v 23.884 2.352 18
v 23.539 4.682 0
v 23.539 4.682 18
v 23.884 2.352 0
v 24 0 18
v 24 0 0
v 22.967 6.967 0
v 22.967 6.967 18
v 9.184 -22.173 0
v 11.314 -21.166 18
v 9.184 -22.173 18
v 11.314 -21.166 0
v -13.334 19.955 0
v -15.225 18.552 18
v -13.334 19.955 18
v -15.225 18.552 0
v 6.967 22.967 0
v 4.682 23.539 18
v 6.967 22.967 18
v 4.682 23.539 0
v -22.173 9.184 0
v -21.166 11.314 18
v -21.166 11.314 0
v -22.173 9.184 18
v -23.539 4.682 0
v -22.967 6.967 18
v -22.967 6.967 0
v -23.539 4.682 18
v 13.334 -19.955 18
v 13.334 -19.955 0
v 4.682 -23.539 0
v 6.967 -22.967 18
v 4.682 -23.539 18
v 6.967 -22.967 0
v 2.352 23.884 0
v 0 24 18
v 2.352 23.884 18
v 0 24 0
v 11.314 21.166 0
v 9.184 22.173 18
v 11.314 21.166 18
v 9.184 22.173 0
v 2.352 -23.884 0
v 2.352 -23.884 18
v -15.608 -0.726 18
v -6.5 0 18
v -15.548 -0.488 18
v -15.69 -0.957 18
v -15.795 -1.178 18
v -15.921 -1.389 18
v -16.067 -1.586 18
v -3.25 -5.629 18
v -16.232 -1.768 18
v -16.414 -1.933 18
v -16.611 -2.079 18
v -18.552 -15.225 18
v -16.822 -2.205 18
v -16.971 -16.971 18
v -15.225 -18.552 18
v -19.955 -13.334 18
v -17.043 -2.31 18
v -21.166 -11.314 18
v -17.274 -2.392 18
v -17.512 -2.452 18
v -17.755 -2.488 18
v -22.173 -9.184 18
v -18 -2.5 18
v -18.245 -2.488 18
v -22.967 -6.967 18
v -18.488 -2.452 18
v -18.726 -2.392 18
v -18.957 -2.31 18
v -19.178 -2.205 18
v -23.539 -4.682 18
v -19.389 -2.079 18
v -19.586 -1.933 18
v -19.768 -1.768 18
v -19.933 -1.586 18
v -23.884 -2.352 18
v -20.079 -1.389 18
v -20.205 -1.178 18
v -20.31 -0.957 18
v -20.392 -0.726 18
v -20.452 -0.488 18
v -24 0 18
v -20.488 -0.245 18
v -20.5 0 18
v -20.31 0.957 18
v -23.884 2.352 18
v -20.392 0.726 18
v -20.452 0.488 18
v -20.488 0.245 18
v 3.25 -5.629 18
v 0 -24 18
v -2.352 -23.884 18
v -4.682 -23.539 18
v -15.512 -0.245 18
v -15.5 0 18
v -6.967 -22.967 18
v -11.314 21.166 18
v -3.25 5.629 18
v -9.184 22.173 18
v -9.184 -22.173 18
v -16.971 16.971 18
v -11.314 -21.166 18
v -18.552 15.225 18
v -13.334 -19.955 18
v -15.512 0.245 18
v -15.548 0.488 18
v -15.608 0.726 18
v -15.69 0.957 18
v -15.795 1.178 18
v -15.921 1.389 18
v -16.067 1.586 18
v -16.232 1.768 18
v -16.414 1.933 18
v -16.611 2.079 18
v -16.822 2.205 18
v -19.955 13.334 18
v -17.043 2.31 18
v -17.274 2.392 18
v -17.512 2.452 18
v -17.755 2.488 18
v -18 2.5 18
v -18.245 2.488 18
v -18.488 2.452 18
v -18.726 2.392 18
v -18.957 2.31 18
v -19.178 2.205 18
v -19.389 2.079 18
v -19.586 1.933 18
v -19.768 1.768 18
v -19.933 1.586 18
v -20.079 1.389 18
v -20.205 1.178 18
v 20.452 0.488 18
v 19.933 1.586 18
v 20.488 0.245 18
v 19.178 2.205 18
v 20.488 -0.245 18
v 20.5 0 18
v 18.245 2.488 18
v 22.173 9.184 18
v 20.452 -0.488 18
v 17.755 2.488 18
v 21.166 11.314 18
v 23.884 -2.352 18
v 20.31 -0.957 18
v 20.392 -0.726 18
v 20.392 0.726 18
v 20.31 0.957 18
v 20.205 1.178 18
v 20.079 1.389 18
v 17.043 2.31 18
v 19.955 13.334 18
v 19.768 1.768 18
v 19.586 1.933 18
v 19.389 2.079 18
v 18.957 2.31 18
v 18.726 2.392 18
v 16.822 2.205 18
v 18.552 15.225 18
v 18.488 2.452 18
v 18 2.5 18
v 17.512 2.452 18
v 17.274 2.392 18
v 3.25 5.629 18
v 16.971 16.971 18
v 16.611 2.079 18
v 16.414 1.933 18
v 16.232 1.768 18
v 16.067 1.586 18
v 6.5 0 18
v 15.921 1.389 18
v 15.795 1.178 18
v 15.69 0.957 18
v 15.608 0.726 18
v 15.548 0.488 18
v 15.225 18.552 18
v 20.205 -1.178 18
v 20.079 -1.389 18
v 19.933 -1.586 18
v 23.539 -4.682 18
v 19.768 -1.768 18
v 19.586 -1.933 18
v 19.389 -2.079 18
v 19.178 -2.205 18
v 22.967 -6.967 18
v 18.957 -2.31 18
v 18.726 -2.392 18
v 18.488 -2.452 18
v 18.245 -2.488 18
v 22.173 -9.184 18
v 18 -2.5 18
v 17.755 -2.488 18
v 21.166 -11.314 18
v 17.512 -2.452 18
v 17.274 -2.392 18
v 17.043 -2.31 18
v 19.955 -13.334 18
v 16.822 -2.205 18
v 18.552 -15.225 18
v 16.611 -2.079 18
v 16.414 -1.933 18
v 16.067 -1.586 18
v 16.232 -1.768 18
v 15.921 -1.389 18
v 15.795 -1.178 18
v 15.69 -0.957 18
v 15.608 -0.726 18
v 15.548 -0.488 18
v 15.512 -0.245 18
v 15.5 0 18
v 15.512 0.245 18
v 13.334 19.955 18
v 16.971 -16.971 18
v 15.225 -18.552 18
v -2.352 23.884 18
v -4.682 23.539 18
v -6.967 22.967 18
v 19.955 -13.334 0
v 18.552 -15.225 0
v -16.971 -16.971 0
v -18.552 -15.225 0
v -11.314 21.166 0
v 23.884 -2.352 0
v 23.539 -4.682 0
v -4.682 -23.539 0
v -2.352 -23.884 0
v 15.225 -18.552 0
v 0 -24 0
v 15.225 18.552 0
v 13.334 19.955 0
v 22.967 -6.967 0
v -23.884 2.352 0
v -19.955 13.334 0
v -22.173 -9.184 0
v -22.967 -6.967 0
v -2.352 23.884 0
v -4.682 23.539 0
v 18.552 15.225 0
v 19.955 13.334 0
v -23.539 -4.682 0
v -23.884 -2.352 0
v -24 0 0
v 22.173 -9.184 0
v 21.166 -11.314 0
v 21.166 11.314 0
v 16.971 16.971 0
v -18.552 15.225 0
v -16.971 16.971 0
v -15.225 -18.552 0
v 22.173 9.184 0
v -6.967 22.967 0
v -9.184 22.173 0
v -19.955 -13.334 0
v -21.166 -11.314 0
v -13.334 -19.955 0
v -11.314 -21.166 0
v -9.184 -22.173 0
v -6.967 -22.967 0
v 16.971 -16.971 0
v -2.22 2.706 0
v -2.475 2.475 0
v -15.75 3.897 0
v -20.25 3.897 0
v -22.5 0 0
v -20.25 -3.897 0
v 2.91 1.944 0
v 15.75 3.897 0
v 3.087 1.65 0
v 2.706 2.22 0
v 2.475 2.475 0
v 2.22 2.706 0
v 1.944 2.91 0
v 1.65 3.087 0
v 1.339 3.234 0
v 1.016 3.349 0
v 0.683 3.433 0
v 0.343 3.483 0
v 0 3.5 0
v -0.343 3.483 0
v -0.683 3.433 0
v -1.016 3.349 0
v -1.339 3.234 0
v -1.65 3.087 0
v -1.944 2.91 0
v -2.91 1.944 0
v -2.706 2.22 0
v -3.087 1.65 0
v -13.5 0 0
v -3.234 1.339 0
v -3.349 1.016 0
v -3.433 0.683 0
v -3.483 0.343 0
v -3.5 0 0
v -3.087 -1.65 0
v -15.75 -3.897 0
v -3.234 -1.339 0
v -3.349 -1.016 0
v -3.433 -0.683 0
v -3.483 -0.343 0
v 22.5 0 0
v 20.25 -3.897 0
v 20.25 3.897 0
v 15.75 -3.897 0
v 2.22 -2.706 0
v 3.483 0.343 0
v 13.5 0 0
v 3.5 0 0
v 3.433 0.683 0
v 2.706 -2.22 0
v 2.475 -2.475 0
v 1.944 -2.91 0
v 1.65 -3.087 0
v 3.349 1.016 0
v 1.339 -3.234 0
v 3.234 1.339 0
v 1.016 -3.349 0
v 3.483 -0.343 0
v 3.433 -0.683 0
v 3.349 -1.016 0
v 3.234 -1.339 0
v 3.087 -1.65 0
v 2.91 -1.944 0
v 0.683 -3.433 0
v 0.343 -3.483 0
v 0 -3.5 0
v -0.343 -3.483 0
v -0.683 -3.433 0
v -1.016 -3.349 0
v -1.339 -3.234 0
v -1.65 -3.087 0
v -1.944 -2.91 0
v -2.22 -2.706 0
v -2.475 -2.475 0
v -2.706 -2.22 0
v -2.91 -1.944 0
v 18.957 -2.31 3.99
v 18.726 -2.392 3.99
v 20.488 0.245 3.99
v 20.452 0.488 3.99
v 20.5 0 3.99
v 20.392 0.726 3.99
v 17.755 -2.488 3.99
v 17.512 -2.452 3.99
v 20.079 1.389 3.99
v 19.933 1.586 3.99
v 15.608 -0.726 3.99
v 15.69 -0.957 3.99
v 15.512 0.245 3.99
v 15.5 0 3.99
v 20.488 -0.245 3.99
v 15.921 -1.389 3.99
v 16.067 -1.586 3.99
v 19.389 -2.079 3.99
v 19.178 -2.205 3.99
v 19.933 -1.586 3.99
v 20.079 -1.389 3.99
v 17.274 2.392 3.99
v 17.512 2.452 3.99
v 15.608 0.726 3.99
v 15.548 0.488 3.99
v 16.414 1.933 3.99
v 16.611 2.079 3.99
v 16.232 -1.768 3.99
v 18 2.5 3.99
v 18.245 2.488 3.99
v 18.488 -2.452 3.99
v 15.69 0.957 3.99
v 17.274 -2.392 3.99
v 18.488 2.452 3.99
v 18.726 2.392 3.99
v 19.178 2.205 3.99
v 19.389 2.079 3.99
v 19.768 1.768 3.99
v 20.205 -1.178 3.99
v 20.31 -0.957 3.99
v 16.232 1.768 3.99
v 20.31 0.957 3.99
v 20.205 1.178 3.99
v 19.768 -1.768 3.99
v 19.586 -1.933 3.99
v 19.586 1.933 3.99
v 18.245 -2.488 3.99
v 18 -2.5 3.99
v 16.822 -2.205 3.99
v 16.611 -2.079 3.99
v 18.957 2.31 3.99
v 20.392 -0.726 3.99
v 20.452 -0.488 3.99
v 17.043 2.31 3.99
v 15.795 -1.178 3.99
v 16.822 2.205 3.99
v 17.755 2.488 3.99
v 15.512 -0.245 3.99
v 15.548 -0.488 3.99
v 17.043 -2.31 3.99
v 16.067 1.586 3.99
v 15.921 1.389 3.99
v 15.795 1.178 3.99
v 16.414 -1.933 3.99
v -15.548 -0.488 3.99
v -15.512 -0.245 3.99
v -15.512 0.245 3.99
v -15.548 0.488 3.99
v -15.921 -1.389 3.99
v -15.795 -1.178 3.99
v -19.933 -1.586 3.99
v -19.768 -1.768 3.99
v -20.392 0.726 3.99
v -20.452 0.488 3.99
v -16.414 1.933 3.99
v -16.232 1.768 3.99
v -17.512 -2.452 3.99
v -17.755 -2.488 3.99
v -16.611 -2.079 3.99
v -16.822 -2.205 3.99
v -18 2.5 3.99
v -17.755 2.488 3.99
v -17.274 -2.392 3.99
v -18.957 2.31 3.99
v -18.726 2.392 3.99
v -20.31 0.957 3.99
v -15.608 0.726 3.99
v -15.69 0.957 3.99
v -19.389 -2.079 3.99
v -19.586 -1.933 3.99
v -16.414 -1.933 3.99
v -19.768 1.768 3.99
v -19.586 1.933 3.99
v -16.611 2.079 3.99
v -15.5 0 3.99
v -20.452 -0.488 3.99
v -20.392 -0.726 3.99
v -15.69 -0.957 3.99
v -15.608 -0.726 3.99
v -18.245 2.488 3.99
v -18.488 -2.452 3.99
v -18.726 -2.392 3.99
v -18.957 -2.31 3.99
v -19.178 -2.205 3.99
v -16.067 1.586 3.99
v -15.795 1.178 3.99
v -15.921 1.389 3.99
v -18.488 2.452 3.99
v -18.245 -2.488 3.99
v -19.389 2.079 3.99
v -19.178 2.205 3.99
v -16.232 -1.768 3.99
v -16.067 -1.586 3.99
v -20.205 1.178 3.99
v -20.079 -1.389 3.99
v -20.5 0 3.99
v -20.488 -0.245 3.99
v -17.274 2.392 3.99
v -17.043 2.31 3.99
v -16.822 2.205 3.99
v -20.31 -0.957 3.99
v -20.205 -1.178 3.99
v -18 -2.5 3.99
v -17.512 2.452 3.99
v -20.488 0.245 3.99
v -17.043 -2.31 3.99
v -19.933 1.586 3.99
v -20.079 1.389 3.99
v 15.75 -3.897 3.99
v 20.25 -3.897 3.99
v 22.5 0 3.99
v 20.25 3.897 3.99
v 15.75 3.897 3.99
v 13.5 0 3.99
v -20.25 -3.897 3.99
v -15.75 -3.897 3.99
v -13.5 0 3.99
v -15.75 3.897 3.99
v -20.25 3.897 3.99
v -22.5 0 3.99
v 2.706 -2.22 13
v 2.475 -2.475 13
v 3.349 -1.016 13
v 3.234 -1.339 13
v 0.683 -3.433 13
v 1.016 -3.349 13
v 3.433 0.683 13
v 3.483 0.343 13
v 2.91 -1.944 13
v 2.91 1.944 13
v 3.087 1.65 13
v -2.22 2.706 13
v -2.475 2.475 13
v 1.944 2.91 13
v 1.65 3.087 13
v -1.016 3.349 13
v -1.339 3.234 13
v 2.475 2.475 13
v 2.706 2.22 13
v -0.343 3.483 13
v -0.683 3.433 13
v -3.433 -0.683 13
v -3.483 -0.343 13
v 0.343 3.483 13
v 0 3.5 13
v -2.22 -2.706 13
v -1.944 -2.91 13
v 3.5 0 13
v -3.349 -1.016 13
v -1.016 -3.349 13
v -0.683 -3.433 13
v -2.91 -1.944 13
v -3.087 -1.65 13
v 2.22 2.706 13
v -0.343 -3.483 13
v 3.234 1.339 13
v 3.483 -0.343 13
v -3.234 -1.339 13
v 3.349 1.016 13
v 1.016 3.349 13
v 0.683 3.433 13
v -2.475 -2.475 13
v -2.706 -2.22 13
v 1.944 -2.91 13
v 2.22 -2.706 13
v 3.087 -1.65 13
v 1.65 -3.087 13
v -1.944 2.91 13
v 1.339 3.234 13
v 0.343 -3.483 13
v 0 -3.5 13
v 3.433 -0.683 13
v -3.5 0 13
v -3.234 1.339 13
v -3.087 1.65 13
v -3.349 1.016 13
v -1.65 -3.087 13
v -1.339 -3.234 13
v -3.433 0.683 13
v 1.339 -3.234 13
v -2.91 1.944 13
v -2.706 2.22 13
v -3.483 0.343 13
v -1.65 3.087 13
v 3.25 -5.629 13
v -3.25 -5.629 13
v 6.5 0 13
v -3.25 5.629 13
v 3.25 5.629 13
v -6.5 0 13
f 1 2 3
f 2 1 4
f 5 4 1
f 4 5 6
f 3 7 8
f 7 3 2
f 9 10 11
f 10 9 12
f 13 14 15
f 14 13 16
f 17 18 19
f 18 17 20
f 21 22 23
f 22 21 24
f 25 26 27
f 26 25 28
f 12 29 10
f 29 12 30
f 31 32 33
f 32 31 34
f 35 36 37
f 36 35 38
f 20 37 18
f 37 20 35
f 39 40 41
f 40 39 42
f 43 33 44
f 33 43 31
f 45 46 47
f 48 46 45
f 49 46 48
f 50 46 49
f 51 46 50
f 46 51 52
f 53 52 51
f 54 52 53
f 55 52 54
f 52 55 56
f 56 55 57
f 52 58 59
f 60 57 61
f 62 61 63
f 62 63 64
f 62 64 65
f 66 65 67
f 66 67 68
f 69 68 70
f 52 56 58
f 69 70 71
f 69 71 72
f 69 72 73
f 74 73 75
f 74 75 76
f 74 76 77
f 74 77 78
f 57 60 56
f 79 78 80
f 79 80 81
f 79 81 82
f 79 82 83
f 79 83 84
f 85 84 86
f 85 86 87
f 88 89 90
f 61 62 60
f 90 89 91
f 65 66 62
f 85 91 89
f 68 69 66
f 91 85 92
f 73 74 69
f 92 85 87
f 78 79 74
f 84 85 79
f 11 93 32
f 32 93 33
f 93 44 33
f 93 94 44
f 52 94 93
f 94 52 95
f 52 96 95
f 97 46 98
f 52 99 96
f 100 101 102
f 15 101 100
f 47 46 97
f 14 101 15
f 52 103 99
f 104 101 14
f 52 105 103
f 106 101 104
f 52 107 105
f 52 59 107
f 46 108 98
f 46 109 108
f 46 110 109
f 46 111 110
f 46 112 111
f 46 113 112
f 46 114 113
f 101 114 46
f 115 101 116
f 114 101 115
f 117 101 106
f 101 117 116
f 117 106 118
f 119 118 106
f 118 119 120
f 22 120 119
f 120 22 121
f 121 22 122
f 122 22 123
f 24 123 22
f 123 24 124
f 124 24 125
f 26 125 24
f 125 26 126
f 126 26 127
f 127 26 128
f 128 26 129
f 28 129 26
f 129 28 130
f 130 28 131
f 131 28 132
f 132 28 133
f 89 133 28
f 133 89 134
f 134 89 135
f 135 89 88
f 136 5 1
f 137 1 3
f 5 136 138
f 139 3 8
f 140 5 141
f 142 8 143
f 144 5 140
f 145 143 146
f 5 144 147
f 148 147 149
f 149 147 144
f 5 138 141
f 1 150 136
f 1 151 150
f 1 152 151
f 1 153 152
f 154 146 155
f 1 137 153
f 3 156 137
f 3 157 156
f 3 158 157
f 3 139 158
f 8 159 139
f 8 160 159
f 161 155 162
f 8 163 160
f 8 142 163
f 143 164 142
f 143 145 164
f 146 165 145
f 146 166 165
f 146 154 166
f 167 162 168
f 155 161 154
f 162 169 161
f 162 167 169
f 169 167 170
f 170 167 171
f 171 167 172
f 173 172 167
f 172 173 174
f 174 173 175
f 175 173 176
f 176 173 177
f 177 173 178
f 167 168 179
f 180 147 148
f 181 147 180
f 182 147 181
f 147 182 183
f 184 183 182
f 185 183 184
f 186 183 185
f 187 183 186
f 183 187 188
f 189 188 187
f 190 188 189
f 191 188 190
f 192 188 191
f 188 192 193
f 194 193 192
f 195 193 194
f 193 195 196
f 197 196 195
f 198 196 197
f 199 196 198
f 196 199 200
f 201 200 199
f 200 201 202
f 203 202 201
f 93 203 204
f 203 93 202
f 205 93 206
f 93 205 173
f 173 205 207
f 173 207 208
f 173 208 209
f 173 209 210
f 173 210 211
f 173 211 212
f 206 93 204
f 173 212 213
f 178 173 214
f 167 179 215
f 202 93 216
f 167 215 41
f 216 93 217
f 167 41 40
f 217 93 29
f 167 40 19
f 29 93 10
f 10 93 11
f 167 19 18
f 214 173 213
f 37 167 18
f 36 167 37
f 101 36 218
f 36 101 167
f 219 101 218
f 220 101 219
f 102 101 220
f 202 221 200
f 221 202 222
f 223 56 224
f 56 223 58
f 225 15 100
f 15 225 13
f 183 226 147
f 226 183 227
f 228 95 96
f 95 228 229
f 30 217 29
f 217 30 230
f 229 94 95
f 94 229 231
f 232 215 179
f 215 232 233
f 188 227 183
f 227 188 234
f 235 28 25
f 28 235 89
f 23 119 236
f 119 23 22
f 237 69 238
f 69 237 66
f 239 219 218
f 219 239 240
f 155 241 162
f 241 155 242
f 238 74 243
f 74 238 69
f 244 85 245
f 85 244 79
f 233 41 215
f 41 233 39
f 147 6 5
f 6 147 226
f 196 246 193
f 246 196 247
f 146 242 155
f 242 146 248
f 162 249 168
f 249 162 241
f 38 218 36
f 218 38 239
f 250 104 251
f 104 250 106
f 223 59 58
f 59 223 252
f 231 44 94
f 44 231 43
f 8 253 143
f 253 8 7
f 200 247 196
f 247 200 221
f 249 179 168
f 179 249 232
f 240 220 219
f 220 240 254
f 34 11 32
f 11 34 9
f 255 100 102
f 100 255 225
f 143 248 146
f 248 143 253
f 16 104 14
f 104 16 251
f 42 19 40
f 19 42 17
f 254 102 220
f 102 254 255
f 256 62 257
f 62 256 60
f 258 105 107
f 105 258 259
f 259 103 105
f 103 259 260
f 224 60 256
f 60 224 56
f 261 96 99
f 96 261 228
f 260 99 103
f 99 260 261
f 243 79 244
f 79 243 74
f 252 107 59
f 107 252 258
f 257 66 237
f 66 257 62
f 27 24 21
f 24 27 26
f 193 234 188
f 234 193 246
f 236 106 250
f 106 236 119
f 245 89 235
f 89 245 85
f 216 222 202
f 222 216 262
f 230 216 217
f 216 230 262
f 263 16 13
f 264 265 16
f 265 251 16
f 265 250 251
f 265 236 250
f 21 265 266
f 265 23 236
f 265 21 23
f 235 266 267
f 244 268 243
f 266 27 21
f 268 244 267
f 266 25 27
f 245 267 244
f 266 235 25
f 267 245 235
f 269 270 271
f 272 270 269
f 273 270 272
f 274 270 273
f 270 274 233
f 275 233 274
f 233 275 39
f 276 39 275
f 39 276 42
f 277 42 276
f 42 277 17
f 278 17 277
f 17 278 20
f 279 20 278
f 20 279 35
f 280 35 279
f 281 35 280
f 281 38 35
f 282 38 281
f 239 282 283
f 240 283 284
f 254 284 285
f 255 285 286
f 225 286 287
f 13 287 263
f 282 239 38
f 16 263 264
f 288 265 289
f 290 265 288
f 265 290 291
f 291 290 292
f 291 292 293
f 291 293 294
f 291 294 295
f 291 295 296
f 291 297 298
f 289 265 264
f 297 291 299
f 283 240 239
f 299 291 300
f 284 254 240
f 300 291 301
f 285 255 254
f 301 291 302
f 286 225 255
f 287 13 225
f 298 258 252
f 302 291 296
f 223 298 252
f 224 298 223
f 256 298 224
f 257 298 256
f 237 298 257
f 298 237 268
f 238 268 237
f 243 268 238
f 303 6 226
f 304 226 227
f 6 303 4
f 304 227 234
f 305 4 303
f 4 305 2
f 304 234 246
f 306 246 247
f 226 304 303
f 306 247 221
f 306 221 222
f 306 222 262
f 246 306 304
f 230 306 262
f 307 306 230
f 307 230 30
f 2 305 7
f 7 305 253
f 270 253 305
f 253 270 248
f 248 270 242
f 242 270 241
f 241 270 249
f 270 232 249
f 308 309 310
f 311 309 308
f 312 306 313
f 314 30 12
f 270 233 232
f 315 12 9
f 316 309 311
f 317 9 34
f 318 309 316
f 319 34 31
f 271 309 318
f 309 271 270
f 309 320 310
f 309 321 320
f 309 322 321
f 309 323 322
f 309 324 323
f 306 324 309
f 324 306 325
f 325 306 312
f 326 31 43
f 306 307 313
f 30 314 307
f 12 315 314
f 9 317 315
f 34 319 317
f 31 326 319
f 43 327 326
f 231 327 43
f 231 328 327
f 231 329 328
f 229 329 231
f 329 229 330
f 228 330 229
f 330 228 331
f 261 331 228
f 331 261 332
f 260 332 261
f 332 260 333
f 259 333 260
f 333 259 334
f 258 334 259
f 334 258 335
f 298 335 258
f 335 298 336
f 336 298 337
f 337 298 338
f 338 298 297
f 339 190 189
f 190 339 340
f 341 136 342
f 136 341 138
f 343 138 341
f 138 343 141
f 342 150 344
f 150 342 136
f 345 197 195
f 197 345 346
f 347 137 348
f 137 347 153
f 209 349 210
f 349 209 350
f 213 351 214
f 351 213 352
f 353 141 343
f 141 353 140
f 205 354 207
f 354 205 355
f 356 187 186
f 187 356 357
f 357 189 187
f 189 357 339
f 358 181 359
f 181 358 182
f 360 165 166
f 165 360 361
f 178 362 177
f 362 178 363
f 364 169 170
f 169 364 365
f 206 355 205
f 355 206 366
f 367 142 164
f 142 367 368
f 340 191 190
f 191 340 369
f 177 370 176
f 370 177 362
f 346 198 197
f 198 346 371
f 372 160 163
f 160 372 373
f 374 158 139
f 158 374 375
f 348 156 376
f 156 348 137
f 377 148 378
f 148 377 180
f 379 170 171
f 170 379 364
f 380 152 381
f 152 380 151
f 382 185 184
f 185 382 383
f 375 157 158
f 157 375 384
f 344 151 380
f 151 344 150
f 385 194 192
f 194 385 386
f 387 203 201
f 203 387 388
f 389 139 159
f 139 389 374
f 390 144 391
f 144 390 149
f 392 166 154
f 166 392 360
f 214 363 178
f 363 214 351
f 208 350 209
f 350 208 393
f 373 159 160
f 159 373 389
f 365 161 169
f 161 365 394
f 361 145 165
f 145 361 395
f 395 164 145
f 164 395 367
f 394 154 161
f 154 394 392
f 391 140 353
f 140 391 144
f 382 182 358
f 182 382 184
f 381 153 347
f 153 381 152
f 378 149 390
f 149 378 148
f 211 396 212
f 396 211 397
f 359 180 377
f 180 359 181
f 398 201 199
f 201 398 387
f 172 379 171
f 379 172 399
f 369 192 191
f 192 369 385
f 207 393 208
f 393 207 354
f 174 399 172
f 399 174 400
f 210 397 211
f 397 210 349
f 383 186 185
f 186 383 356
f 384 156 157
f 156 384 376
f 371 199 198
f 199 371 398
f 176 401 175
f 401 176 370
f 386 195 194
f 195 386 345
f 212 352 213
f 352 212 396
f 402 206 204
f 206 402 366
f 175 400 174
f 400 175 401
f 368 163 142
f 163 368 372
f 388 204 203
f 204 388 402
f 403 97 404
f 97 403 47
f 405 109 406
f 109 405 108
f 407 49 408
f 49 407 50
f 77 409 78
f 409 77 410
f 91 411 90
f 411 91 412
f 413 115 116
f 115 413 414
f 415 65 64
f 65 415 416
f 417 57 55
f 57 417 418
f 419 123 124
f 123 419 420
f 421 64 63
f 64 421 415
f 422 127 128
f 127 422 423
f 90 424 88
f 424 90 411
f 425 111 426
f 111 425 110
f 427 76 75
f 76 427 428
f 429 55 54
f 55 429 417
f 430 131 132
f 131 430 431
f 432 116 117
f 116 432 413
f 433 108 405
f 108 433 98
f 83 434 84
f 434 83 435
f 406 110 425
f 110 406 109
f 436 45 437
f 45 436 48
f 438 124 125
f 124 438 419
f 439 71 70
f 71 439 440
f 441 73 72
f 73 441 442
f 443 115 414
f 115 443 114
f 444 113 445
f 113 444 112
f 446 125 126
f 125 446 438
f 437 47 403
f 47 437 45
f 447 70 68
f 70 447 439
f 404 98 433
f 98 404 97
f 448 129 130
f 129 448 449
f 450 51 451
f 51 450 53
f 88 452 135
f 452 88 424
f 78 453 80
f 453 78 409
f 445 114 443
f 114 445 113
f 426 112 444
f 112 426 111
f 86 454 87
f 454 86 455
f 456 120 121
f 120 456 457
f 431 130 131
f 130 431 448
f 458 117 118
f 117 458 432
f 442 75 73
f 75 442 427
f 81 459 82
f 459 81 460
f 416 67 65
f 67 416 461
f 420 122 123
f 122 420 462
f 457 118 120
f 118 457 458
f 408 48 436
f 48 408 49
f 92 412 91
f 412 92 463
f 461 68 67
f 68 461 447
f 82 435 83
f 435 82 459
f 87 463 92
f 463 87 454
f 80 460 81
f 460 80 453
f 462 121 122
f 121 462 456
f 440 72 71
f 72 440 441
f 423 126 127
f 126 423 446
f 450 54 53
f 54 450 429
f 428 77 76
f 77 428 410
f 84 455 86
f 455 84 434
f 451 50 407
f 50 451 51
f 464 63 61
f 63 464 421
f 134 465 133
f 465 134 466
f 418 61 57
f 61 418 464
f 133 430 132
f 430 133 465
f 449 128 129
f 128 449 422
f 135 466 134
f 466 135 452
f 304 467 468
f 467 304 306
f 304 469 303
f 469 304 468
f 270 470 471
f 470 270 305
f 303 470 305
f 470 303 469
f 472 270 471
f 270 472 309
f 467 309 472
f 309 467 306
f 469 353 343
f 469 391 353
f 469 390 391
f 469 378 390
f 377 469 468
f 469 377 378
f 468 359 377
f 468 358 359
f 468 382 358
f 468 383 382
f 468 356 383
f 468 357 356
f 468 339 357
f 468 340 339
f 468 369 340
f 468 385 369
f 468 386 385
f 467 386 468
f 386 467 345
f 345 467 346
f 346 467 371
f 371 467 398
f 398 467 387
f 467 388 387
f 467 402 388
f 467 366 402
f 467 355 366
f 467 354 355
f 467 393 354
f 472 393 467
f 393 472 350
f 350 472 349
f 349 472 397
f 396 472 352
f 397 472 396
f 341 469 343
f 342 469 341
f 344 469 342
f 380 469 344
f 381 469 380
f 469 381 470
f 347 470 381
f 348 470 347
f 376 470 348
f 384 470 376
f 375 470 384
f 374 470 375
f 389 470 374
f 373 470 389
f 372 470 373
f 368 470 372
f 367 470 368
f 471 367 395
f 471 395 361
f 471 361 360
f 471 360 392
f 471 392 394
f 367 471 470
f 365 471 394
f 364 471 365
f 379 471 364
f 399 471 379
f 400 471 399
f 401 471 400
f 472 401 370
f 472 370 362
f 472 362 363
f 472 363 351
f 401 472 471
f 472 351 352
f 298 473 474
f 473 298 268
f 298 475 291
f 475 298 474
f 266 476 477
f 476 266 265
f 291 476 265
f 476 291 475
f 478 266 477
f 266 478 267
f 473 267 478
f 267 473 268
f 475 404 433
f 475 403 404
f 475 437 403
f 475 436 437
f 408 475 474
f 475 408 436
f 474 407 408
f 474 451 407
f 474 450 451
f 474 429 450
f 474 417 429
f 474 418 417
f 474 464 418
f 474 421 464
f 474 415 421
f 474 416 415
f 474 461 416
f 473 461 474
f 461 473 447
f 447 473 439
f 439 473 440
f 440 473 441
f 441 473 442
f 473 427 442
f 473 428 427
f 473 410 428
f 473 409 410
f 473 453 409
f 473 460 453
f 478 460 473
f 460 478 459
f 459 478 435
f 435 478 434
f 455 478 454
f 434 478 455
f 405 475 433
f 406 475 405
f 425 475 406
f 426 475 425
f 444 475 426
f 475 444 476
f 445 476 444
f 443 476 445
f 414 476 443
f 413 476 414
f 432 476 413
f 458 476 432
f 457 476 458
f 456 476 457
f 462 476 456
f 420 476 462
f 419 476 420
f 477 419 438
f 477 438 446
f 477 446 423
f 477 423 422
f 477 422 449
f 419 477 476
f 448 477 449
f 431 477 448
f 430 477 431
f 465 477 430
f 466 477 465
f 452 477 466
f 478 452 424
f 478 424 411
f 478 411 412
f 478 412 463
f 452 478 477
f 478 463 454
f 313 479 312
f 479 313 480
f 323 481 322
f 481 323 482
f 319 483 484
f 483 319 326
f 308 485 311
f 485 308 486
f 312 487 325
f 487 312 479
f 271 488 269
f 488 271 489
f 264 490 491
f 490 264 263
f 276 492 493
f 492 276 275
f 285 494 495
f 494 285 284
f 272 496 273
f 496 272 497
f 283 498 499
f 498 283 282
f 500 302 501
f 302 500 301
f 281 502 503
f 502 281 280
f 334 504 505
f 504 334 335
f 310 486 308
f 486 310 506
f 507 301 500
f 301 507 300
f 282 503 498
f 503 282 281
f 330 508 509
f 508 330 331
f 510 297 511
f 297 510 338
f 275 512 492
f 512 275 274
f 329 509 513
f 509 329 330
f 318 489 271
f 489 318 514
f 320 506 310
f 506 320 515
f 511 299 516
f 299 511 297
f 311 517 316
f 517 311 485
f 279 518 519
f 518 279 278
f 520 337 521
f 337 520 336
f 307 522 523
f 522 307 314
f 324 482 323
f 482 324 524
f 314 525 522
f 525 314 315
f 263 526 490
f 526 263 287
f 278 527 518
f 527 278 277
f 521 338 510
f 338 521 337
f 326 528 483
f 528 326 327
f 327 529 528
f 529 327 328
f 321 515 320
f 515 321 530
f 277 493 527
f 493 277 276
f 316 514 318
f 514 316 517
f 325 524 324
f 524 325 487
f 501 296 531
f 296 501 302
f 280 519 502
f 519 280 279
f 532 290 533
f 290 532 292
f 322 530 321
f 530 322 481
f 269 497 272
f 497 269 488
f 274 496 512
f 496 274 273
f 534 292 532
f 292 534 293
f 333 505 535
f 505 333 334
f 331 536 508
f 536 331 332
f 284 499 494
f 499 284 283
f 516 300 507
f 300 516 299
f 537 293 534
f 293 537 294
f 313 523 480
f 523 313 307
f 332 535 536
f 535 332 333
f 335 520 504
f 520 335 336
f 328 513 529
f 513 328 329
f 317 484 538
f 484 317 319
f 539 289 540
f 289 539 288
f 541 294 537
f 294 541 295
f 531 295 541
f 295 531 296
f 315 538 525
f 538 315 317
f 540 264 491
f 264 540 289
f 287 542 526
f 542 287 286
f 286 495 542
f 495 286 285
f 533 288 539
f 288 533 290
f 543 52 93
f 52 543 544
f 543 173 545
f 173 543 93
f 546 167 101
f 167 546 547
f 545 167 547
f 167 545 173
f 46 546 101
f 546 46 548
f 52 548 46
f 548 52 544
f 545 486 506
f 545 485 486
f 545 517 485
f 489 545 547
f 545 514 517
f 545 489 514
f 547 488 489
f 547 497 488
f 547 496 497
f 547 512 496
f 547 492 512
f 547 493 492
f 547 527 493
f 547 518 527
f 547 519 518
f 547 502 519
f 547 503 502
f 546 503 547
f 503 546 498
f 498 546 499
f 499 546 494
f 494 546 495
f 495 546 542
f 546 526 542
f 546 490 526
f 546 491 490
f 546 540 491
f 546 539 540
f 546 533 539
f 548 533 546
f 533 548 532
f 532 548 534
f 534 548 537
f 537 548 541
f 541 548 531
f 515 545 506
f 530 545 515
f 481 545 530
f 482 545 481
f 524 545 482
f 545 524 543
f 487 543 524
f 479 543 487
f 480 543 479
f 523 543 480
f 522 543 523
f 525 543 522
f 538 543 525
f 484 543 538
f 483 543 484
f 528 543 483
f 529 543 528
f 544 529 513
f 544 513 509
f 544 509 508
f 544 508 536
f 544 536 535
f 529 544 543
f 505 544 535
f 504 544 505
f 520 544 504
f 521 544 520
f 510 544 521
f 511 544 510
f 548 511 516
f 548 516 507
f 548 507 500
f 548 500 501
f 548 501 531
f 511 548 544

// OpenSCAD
/*Project: camera stab
alternative non-adjustable plate for steadycam */
$fn=64;
db=7; //central hole diameter
ds=5; //smaller hole diameter
hb=5; //height of head of central screw
hs=4; //height of smaller nut
nb=13; //size of head of central screw
ns=9; //size of head of smaller nuts
d=36; //distance between holes
pd=48; //plate diameter
h=18; //plate height
difference() {
  cylinder(h=h,d=pd);
  translate([d/2,0,-0.01]) cylinder (d=ds,h=h+0.02);
  translate([-d/2,0,-0.01]) cylinder (d=ds,h=h+0.02);
  translate([d/2,0,-0.01]) cylinder ($fn=6,d=ns,h=hs);
  translate([-d/2,0,-0.01]) cylinder ($fn=6,d=ns,h=hs);
  translate([0,0,-0.01]) cylinder (d=db,h=h+0.02);
  translate([0,0,h-hb]) cylinder ($fn=6,d=nb,h=hb+0.01);
}
